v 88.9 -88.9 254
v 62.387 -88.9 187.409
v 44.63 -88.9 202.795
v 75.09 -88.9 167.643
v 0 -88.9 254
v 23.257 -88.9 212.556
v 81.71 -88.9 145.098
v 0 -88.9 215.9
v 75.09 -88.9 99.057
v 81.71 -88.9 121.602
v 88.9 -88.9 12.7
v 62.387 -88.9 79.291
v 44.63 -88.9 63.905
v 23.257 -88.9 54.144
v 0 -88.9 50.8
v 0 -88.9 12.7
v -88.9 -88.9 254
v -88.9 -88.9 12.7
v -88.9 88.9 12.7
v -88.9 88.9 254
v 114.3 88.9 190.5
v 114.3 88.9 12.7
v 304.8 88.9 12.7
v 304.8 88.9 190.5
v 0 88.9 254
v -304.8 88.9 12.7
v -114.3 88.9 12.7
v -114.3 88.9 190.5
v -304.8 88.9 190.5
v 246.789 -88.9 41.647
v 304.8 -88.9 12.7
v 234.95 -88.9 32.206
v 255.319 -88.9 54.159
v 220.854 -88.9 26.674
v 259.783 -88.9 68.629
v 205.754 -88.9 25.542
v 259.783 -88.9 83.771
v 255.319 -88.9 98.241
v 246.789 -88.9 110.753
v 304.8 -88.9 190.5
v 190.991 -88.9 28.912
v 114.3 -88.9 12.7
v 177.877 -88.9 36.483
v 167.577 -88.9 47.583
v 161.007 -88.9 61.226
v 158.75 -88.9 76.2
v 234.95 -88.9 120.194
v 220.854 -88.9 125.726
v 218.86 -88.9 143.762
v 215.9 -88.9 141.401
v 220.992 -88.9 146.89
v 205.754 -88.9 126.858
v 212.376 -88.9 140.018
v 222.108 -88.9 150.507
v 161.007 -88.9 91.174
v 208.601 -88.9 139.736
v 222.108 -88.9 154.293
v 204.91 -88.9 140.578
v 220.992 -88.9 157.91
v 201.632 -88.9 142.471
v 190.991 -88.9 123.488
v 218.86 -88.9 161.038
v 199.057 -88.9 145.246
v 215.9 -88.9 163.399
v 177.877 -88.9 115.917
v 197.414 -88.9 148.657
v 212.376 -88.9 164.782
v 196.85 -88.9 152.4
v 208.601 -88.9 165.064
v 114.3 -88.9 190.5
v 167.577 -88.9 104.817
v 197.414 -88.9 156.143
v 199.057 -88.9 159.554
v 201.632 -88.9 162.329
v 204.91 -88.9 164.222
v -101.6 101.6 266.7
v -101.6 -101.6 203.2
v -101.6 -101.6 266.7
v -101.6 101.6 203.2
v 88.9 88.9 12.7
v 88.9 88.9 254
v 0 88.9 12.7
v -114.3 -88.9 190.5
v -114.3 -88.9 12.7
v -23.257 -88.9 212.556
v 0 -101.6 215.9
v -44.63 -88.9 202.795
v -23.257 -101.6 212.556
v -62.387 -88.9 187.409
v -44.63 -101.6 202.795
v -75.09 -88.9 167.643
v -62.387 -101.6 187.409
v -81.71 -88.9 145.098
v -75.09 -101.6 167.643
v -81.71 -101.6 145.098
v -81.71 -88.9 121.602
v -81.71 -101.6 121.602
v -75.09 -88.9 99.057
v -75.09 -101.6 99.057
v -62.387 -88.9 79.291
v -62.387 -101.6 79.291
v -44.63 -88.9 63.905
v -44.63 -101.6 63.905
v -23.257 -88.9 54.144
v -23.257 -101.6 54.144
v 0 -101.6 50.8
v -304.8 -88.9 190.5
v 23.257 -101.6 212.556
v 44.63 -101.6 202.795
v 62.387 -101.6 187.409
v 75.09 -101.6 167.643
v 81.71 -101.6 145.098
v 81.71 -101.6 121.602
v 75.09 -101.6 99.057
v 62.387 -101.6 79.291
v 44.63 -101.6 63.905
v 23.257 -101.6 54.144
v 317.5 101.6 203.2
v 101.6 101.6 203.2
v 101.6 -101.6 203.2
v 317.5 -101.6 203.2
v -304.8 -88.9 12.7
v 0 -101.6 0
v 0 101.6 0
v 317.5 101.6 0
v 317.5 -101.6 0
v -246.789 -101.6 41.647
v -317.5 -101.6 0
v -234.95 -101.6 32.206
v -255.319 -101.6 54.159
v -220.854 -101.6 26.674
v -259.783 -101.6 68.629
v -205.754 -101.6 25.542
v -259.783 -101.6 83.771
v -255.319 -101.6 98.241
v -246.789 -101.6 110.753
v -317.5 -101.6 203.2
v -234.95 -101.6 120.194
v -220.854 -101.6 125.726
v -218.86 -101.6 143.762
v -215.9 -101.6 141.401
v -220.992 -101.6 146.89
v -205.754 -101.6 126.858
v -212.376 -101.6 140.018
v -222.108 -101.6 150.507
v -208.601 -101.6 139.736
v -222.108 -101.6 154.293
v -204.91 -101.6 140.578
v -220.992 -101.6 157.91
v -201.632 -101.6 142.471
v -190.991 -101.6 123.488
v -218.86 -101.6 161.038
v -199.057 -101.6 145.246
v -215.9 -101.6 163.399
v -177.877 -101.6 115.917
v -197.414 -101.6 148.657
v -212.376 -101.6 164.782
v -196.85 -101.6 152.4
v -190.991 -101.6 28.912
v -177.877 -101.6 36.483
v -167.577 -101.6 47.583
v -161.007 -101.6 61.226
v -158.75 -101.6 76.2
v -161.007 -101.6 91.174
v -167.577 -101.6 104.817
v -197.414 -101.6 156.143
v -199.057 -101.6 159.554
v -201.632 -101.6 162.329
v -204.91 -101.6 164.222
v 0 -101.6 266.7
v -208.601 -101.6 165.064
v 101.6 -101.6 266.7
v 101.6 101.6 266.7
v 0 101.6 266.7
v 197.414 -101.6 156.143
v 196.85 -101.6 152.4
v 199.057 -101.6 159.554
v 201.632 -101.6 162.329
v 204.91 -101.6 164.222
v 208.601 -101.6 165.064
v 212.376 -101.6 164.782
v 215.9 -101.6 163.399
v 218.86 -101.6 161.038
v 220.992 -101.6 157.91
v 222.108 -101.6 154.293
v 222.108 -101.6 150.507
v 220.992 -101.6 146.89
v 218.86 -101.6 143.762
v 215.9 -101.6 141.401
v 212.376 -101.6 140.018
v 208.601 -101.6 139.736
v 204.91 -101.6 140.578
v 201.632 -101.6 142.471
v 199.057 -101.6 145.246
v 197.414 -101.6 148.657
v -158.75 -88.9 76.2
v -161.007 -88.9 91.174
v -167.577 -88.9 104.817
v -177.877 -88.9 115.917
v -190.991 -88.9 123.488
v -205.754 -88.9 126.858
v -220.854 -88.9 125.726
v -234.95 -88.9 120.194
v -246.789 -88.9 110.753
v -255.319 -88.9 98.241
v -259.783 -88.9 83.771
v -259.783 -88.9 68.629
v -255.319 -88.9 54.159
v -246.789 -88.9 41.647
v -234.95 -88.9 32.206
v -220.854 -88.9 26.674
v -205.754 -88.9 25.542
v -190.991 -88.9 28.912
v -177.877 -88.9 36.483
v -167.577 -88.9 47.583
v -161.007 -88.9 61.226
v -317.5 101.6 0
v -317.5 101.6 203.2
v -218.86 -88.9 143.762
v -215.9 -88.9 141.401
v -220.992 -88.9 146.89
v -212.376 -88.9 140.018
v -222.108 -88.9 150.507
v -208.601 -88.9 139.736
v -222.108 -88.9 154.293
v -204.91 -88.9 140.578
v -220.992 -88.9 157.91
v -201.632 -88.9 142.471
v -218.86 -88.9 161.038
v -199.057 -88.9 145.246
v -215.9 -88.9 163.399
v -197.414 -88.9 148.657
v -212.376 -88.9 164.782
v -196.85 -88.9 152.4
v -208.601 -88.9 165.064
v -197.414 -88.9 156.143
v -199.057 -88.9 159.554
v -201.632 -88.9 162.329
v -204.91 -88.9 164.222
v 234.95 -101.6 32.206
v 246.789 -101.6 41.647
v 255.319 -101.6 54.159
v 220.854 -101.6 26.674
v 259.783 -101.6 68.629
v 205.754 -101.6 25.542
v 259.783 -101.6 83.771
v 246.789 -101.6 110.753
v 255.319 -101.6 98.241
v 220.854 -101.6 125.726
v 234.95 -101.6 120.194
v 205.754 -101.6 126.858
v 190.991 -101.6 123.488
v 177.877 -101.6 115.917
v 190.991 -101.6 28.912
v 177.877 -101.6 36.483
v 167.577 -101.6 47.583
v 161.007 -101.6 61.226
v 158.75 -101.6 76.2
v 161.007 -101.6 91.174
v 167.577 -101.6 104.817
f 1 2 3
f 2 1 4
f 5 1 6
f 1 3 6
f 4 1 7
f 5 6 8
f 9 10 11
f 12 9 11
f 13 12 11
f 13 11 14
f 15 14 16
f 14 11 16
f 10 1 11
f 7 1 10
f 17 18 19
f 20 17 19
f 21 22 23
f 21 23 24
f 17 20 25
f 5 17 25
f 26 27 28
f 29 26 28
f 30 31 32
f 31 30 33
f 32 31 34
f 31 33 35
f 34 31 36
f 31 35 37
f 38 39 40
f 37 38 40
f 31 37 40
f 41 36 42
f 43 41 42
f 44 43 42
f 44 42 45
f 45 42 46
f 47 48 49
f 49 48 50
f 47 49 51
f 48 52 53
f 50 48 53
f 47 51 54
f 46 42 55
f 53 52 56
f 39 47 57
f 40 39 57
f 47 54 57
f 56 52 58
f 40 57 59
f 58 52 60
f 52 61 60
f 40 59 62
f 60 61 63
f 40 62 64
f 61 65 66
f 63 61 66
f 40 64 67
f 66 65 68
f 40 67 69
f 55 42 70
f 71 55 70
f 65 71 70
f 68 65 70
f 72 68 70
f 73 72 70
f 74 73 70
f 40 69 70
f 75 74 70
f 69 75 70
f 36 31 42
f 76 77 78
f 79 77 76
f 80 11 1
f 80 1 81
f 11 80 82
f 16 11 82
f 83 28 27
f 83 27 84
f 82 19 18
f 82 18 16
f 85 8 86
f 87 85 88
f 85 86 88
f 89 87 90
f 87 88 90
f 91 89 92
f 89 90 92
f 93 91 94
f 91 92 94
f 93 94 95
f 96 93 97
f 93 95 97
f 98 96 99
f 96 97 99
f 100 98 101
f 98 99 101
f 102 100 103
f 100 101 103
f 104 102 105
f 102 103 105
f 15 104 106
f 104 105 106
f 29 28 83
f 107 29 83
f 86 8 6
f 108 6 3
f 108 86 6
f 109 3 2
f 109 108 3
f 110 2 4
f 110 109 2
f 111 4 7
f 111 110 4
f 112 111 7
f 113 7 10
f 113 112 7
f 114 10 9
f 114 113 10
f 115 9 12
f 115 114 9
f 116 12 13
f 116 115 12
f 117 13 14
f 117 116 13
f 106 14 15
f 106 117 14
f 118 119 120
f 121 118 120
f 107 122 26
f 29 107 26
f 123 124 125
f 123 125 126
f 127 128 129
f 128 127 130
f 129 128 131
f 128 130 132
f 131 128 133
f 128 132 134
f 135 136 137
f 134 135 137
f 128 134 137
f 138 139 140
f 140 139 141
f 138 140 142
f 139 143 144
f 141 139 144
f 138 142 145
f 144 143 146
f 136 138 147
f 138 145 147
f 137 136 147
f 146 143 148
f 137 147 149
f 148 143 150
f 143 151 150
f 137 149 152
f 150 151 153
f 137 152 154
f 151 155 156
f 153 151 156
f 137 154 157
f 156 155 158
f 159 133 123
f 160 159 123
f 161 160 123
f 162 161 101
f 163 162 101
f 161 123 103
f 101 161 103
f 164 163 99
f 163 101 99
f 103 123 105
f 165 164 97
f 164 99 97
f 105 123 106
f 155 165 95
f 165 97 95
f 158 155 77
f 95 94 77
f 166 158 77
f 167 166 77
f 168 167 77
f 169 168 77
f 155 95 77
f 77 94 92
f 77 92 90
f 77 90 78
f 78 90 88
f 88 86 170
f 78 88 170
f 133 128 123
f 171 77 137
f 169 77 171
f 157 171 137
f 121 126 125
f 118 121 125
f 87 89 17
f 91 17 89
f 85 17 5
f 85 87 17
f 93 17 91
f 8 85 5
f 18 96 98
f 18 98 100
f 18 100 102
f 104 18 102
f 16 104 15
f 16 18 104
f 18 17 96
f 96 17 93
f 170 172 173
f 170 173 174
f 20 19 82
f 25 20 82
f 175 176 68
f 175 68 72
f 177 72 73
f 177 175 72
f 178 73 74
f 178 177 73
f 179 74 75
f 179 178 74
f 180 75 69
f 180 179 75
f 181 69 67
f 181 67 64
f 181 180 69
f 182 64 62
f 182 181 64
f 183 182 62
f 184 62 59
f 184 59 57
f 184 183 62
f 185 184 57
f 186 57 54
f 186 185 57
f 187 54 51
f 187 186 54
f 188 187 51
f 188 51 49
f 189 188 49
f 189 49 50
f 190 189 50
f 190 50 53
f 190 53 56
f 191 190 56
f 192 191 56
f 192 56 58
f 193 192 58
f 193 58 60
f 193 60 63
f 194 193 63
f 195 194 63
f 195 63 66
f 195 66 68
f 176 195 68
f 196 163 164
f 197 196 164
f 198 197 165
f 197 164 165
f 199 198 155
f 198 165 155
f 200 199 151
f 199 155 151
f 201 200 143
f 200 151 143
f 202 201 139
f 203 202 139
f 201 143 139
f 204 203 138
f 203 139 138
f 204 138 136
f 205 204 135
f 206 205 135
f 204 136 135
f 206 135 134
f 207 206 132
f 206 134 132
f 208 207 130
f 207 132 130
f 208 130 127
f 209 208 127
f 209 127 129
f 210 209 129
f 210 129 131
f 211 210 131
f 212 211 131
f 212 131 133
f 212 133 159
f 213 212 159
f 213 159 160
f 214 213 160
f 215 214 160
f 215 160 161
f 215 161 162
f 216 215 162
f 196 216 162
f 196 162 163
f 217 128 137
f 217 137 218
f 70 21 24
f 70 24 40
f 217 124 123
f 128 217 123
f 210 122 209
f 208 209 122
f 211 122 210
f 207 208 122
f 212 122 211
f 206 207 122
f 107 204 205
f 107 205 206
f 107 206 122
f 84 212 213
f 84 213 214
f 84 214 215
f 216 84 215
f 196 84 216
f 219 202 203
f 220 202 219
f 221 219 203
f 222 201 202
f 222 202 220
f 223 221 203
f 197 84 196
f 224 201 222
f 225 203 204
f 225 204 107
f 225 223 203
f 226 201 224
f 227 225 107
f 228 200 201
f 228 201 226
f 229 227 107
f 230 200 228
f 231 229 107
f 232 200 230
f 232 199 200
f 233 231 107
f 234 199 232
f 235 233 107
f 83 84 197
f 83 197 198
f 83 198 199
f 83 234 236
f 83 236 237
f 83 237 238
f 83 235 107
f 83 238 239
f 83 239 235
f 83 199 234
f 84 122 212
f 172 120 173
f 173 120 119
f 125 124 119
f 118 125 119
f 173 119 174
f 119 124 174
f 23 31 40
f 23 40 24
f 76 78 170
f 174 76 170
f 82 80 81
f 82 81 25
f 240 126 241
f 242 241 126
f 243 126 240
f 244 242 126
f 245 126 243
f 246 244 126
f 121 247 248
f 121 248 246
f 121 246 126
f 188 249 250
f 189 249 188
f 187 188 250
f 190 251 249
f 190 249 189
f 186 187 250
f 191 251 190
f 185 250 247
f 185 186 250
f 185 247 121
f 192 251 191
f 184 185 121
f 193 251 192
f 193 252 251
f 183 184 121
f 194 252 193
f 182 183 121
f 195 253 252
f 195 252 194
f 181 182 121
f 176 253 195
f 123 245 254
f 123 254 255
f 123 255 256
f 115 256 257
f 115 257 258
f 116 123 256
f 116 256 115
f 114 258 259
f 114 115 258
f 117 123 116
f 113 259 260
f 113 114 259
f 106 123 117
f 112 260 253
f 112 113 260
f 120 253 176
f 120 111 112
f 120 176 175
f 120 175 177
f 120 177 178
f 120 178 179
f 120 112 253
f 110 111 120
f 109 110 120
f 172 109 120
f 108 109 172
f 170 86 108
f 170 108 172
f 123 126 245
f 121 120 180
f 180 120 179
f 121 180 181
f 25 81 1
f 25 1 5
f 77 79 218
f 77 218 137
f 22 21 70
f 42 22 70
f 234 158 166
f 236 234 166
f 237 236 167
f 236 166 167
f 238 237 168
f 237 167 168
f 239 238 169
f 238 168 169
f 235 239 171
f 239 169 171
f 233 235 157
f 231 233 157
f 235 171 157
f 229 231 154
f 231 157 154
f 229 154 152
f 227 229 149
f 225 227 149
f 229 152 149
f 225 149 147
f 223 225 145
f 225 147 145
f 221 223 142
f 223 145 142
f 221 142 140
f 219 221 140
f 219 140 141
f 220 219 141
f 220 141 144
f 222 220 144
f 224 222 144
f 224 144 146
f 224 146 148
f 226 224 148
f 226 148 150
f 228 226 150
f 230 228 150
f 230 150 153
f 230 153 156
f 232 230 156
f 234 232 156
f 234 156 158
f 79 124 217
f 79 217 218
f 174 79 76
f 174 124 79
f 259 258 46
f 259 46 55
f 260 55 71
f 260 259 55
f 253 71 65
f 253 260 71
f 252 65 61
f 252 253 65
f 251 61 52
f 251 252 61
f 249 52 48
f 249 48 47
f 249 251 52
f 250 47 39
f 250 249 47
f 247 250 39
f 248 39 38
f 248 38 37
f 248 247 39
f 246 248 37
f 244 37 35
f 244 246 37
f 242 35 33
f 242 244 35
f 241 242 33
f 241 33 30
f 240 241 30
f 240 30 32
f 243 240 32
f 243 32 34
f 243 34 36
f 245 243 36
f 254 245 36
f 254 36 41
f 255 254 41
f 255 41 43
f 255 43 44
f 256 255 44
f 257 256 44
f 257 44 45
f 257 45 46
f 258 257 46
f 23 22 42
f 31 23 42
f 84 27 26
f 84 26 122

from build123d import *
from build123d import SkipClean  # not in build123d's __all__

# Parameters (mm, degrees)
F0_W      = 203.2
F0_H      = 203.2
F1_DEPTH  = 12.7
F2_W      = 203.2
F2_H      = 203.2
F2_W_2    = 177.8
F2_H_2    = 177.8
F3_DEPTH  = 254
F4_W      = 203.2
F4_H      = 203.2
F4_W_2    = 177.8
F4_H_2    = 177.8
F5_DEPTH  = 12.7
F6_W      = 203.2
F6_H      = 203.2
F7_DEPTH  = 12.7
F8_W      = 203.2
F8_H      = 203.2
F8_W_2    = 177.8
F8_H_2    = 177.8
F9_DEPTH  = 203.2
F10_W     = 12.7
F10_H     = 177.8
F11_DEPTH = 177.8
F12_R     = 50.8
F12_R_2   = 12.7
F12_R_3   = 82.55
F13_DEPTH = 25.4
F15_DEPTH = 203.2


with BuildPart() as f1:
    # F0 (on Top) → F1 (new body)
    with BuildSketch(Plane.XY):
        Rectangle(F0_W, F0_H)
    extrude(amount=F1_DEPTH)

    # F2 (on face) → F3 (join)
    with BuildSketch(Plane.XY.offset(12.7)):
        Rectangle(F2_W, F2_H)
        Rectangle(F2_W_2, F2_H_2, mode=Mode.SUBTRACT)
    extrude(amount=F3_DEPTH)

    # F4 (on face) → F5 (join)
    with BuildSketch(Plane.XY.offset(266.7)):
        Rectangle(F4_W, F4_H)
        Rectangle(F4_W_2, F4_H_2, mode=Mode.SUBTRACT)
        Rectangle(F4_W_2, F4_H_2)
    extrude(amount=-F5_DEPTH)

    # F6 (on face) → F7 (join)
    with BuildSketch(Plane(origin=(-101.6, 0, 0), x_dir=(0, -1, 0), z_dir=(-1, 0, 0))):
        with Locations((0, 101.6)):
            Rectangle(F6_W, F6_H)
    extrude(amount=F7_DEPTH)

    # F8 (on face) → F9 (join)
    with BuildSketch(Plane(origin=(-114.3, 0, 0), x_dir=(0, -1, 0), z_dir=(-1, 0, 0))):
        with Locations((0, 101.6)):
            Rectangle(F8_W, F8_H)
        with Locations((0, 101.6)):
            Rectangle(F8_W_2, F8_H_2, mode=Mode.SUBTRACT)
    extrude(amount=F9_DEPTH)

    # F10 (on face) → F11 (join)
    with BuildSketch(Plane.XY.offset(12.7)):
        with Locations((-311.15, 0)):
            Rectangle(F10_W, F10_H)
    extrude(amount=F11_DEPTH)

    # F12 (on face) → F13 (cut)
    with BuildSketch(Plane.XZ.offset(101.6)):
        with Locations((-209.55, 76.2)):
            Circle(F12_R)
        with Locations((-209.55, 152.4)):
            Circle(F12_R_2)
        with Locations((0, 133.35)):
            Circle(F12_R_3)
    extrude(amount=-F13_DEPTH, mode=Mode.SUBTRACT)

    # F14 (on face) → F15 (cut)
    with BuildSketch(Plane.XZ.offset(101.6)):
        with BuildLine():
            Line((101.6, 0), (101.6, 266.7))
            Line((101.6, 266.7), (0, 266.7))
            Line((0, 266.7), (0, 215.9))
            ThreePointArc((0, 215.9), (58.3716647869, 191.7216647869), (82.55, 133.35))
            ThreePointArc((82.55, 133.35), (58.3716647869, 74.9783352131), (0, 50.8))
            Line((0, 50.8), (0, 0))
            Line((0, 0), (101.6, 0))
        make_face()
        with BuildLine():
            ThreePointArc((82.55, 133.35), (58.3716647869, 191.7216647869), (0, 215.9))
            Line((0, 215.9), (0, 50.8))
            ThreePointArc((0, 50.8), (58.3716647869, 74.9783352131), (82.55, 133.35))
        make_face()
    extrude(amount=-F15_DEPTH, mode=Mode.SUBTRACT)

    # F16: F1 across face


with BuildPart() as f1_1:
    add(f1.part, clean=False)
    with SkipClean():  # cleaning this boolean's faces spoils the solid; the shape is the same uncleaned
        add(f1.part.mirror(Plane(origin=(0, 21.7236842105, 133.35), x_dir=(0, 1, 0), z_dir=(1, 0, 0))), clean=False)


solid = f1_1.part
